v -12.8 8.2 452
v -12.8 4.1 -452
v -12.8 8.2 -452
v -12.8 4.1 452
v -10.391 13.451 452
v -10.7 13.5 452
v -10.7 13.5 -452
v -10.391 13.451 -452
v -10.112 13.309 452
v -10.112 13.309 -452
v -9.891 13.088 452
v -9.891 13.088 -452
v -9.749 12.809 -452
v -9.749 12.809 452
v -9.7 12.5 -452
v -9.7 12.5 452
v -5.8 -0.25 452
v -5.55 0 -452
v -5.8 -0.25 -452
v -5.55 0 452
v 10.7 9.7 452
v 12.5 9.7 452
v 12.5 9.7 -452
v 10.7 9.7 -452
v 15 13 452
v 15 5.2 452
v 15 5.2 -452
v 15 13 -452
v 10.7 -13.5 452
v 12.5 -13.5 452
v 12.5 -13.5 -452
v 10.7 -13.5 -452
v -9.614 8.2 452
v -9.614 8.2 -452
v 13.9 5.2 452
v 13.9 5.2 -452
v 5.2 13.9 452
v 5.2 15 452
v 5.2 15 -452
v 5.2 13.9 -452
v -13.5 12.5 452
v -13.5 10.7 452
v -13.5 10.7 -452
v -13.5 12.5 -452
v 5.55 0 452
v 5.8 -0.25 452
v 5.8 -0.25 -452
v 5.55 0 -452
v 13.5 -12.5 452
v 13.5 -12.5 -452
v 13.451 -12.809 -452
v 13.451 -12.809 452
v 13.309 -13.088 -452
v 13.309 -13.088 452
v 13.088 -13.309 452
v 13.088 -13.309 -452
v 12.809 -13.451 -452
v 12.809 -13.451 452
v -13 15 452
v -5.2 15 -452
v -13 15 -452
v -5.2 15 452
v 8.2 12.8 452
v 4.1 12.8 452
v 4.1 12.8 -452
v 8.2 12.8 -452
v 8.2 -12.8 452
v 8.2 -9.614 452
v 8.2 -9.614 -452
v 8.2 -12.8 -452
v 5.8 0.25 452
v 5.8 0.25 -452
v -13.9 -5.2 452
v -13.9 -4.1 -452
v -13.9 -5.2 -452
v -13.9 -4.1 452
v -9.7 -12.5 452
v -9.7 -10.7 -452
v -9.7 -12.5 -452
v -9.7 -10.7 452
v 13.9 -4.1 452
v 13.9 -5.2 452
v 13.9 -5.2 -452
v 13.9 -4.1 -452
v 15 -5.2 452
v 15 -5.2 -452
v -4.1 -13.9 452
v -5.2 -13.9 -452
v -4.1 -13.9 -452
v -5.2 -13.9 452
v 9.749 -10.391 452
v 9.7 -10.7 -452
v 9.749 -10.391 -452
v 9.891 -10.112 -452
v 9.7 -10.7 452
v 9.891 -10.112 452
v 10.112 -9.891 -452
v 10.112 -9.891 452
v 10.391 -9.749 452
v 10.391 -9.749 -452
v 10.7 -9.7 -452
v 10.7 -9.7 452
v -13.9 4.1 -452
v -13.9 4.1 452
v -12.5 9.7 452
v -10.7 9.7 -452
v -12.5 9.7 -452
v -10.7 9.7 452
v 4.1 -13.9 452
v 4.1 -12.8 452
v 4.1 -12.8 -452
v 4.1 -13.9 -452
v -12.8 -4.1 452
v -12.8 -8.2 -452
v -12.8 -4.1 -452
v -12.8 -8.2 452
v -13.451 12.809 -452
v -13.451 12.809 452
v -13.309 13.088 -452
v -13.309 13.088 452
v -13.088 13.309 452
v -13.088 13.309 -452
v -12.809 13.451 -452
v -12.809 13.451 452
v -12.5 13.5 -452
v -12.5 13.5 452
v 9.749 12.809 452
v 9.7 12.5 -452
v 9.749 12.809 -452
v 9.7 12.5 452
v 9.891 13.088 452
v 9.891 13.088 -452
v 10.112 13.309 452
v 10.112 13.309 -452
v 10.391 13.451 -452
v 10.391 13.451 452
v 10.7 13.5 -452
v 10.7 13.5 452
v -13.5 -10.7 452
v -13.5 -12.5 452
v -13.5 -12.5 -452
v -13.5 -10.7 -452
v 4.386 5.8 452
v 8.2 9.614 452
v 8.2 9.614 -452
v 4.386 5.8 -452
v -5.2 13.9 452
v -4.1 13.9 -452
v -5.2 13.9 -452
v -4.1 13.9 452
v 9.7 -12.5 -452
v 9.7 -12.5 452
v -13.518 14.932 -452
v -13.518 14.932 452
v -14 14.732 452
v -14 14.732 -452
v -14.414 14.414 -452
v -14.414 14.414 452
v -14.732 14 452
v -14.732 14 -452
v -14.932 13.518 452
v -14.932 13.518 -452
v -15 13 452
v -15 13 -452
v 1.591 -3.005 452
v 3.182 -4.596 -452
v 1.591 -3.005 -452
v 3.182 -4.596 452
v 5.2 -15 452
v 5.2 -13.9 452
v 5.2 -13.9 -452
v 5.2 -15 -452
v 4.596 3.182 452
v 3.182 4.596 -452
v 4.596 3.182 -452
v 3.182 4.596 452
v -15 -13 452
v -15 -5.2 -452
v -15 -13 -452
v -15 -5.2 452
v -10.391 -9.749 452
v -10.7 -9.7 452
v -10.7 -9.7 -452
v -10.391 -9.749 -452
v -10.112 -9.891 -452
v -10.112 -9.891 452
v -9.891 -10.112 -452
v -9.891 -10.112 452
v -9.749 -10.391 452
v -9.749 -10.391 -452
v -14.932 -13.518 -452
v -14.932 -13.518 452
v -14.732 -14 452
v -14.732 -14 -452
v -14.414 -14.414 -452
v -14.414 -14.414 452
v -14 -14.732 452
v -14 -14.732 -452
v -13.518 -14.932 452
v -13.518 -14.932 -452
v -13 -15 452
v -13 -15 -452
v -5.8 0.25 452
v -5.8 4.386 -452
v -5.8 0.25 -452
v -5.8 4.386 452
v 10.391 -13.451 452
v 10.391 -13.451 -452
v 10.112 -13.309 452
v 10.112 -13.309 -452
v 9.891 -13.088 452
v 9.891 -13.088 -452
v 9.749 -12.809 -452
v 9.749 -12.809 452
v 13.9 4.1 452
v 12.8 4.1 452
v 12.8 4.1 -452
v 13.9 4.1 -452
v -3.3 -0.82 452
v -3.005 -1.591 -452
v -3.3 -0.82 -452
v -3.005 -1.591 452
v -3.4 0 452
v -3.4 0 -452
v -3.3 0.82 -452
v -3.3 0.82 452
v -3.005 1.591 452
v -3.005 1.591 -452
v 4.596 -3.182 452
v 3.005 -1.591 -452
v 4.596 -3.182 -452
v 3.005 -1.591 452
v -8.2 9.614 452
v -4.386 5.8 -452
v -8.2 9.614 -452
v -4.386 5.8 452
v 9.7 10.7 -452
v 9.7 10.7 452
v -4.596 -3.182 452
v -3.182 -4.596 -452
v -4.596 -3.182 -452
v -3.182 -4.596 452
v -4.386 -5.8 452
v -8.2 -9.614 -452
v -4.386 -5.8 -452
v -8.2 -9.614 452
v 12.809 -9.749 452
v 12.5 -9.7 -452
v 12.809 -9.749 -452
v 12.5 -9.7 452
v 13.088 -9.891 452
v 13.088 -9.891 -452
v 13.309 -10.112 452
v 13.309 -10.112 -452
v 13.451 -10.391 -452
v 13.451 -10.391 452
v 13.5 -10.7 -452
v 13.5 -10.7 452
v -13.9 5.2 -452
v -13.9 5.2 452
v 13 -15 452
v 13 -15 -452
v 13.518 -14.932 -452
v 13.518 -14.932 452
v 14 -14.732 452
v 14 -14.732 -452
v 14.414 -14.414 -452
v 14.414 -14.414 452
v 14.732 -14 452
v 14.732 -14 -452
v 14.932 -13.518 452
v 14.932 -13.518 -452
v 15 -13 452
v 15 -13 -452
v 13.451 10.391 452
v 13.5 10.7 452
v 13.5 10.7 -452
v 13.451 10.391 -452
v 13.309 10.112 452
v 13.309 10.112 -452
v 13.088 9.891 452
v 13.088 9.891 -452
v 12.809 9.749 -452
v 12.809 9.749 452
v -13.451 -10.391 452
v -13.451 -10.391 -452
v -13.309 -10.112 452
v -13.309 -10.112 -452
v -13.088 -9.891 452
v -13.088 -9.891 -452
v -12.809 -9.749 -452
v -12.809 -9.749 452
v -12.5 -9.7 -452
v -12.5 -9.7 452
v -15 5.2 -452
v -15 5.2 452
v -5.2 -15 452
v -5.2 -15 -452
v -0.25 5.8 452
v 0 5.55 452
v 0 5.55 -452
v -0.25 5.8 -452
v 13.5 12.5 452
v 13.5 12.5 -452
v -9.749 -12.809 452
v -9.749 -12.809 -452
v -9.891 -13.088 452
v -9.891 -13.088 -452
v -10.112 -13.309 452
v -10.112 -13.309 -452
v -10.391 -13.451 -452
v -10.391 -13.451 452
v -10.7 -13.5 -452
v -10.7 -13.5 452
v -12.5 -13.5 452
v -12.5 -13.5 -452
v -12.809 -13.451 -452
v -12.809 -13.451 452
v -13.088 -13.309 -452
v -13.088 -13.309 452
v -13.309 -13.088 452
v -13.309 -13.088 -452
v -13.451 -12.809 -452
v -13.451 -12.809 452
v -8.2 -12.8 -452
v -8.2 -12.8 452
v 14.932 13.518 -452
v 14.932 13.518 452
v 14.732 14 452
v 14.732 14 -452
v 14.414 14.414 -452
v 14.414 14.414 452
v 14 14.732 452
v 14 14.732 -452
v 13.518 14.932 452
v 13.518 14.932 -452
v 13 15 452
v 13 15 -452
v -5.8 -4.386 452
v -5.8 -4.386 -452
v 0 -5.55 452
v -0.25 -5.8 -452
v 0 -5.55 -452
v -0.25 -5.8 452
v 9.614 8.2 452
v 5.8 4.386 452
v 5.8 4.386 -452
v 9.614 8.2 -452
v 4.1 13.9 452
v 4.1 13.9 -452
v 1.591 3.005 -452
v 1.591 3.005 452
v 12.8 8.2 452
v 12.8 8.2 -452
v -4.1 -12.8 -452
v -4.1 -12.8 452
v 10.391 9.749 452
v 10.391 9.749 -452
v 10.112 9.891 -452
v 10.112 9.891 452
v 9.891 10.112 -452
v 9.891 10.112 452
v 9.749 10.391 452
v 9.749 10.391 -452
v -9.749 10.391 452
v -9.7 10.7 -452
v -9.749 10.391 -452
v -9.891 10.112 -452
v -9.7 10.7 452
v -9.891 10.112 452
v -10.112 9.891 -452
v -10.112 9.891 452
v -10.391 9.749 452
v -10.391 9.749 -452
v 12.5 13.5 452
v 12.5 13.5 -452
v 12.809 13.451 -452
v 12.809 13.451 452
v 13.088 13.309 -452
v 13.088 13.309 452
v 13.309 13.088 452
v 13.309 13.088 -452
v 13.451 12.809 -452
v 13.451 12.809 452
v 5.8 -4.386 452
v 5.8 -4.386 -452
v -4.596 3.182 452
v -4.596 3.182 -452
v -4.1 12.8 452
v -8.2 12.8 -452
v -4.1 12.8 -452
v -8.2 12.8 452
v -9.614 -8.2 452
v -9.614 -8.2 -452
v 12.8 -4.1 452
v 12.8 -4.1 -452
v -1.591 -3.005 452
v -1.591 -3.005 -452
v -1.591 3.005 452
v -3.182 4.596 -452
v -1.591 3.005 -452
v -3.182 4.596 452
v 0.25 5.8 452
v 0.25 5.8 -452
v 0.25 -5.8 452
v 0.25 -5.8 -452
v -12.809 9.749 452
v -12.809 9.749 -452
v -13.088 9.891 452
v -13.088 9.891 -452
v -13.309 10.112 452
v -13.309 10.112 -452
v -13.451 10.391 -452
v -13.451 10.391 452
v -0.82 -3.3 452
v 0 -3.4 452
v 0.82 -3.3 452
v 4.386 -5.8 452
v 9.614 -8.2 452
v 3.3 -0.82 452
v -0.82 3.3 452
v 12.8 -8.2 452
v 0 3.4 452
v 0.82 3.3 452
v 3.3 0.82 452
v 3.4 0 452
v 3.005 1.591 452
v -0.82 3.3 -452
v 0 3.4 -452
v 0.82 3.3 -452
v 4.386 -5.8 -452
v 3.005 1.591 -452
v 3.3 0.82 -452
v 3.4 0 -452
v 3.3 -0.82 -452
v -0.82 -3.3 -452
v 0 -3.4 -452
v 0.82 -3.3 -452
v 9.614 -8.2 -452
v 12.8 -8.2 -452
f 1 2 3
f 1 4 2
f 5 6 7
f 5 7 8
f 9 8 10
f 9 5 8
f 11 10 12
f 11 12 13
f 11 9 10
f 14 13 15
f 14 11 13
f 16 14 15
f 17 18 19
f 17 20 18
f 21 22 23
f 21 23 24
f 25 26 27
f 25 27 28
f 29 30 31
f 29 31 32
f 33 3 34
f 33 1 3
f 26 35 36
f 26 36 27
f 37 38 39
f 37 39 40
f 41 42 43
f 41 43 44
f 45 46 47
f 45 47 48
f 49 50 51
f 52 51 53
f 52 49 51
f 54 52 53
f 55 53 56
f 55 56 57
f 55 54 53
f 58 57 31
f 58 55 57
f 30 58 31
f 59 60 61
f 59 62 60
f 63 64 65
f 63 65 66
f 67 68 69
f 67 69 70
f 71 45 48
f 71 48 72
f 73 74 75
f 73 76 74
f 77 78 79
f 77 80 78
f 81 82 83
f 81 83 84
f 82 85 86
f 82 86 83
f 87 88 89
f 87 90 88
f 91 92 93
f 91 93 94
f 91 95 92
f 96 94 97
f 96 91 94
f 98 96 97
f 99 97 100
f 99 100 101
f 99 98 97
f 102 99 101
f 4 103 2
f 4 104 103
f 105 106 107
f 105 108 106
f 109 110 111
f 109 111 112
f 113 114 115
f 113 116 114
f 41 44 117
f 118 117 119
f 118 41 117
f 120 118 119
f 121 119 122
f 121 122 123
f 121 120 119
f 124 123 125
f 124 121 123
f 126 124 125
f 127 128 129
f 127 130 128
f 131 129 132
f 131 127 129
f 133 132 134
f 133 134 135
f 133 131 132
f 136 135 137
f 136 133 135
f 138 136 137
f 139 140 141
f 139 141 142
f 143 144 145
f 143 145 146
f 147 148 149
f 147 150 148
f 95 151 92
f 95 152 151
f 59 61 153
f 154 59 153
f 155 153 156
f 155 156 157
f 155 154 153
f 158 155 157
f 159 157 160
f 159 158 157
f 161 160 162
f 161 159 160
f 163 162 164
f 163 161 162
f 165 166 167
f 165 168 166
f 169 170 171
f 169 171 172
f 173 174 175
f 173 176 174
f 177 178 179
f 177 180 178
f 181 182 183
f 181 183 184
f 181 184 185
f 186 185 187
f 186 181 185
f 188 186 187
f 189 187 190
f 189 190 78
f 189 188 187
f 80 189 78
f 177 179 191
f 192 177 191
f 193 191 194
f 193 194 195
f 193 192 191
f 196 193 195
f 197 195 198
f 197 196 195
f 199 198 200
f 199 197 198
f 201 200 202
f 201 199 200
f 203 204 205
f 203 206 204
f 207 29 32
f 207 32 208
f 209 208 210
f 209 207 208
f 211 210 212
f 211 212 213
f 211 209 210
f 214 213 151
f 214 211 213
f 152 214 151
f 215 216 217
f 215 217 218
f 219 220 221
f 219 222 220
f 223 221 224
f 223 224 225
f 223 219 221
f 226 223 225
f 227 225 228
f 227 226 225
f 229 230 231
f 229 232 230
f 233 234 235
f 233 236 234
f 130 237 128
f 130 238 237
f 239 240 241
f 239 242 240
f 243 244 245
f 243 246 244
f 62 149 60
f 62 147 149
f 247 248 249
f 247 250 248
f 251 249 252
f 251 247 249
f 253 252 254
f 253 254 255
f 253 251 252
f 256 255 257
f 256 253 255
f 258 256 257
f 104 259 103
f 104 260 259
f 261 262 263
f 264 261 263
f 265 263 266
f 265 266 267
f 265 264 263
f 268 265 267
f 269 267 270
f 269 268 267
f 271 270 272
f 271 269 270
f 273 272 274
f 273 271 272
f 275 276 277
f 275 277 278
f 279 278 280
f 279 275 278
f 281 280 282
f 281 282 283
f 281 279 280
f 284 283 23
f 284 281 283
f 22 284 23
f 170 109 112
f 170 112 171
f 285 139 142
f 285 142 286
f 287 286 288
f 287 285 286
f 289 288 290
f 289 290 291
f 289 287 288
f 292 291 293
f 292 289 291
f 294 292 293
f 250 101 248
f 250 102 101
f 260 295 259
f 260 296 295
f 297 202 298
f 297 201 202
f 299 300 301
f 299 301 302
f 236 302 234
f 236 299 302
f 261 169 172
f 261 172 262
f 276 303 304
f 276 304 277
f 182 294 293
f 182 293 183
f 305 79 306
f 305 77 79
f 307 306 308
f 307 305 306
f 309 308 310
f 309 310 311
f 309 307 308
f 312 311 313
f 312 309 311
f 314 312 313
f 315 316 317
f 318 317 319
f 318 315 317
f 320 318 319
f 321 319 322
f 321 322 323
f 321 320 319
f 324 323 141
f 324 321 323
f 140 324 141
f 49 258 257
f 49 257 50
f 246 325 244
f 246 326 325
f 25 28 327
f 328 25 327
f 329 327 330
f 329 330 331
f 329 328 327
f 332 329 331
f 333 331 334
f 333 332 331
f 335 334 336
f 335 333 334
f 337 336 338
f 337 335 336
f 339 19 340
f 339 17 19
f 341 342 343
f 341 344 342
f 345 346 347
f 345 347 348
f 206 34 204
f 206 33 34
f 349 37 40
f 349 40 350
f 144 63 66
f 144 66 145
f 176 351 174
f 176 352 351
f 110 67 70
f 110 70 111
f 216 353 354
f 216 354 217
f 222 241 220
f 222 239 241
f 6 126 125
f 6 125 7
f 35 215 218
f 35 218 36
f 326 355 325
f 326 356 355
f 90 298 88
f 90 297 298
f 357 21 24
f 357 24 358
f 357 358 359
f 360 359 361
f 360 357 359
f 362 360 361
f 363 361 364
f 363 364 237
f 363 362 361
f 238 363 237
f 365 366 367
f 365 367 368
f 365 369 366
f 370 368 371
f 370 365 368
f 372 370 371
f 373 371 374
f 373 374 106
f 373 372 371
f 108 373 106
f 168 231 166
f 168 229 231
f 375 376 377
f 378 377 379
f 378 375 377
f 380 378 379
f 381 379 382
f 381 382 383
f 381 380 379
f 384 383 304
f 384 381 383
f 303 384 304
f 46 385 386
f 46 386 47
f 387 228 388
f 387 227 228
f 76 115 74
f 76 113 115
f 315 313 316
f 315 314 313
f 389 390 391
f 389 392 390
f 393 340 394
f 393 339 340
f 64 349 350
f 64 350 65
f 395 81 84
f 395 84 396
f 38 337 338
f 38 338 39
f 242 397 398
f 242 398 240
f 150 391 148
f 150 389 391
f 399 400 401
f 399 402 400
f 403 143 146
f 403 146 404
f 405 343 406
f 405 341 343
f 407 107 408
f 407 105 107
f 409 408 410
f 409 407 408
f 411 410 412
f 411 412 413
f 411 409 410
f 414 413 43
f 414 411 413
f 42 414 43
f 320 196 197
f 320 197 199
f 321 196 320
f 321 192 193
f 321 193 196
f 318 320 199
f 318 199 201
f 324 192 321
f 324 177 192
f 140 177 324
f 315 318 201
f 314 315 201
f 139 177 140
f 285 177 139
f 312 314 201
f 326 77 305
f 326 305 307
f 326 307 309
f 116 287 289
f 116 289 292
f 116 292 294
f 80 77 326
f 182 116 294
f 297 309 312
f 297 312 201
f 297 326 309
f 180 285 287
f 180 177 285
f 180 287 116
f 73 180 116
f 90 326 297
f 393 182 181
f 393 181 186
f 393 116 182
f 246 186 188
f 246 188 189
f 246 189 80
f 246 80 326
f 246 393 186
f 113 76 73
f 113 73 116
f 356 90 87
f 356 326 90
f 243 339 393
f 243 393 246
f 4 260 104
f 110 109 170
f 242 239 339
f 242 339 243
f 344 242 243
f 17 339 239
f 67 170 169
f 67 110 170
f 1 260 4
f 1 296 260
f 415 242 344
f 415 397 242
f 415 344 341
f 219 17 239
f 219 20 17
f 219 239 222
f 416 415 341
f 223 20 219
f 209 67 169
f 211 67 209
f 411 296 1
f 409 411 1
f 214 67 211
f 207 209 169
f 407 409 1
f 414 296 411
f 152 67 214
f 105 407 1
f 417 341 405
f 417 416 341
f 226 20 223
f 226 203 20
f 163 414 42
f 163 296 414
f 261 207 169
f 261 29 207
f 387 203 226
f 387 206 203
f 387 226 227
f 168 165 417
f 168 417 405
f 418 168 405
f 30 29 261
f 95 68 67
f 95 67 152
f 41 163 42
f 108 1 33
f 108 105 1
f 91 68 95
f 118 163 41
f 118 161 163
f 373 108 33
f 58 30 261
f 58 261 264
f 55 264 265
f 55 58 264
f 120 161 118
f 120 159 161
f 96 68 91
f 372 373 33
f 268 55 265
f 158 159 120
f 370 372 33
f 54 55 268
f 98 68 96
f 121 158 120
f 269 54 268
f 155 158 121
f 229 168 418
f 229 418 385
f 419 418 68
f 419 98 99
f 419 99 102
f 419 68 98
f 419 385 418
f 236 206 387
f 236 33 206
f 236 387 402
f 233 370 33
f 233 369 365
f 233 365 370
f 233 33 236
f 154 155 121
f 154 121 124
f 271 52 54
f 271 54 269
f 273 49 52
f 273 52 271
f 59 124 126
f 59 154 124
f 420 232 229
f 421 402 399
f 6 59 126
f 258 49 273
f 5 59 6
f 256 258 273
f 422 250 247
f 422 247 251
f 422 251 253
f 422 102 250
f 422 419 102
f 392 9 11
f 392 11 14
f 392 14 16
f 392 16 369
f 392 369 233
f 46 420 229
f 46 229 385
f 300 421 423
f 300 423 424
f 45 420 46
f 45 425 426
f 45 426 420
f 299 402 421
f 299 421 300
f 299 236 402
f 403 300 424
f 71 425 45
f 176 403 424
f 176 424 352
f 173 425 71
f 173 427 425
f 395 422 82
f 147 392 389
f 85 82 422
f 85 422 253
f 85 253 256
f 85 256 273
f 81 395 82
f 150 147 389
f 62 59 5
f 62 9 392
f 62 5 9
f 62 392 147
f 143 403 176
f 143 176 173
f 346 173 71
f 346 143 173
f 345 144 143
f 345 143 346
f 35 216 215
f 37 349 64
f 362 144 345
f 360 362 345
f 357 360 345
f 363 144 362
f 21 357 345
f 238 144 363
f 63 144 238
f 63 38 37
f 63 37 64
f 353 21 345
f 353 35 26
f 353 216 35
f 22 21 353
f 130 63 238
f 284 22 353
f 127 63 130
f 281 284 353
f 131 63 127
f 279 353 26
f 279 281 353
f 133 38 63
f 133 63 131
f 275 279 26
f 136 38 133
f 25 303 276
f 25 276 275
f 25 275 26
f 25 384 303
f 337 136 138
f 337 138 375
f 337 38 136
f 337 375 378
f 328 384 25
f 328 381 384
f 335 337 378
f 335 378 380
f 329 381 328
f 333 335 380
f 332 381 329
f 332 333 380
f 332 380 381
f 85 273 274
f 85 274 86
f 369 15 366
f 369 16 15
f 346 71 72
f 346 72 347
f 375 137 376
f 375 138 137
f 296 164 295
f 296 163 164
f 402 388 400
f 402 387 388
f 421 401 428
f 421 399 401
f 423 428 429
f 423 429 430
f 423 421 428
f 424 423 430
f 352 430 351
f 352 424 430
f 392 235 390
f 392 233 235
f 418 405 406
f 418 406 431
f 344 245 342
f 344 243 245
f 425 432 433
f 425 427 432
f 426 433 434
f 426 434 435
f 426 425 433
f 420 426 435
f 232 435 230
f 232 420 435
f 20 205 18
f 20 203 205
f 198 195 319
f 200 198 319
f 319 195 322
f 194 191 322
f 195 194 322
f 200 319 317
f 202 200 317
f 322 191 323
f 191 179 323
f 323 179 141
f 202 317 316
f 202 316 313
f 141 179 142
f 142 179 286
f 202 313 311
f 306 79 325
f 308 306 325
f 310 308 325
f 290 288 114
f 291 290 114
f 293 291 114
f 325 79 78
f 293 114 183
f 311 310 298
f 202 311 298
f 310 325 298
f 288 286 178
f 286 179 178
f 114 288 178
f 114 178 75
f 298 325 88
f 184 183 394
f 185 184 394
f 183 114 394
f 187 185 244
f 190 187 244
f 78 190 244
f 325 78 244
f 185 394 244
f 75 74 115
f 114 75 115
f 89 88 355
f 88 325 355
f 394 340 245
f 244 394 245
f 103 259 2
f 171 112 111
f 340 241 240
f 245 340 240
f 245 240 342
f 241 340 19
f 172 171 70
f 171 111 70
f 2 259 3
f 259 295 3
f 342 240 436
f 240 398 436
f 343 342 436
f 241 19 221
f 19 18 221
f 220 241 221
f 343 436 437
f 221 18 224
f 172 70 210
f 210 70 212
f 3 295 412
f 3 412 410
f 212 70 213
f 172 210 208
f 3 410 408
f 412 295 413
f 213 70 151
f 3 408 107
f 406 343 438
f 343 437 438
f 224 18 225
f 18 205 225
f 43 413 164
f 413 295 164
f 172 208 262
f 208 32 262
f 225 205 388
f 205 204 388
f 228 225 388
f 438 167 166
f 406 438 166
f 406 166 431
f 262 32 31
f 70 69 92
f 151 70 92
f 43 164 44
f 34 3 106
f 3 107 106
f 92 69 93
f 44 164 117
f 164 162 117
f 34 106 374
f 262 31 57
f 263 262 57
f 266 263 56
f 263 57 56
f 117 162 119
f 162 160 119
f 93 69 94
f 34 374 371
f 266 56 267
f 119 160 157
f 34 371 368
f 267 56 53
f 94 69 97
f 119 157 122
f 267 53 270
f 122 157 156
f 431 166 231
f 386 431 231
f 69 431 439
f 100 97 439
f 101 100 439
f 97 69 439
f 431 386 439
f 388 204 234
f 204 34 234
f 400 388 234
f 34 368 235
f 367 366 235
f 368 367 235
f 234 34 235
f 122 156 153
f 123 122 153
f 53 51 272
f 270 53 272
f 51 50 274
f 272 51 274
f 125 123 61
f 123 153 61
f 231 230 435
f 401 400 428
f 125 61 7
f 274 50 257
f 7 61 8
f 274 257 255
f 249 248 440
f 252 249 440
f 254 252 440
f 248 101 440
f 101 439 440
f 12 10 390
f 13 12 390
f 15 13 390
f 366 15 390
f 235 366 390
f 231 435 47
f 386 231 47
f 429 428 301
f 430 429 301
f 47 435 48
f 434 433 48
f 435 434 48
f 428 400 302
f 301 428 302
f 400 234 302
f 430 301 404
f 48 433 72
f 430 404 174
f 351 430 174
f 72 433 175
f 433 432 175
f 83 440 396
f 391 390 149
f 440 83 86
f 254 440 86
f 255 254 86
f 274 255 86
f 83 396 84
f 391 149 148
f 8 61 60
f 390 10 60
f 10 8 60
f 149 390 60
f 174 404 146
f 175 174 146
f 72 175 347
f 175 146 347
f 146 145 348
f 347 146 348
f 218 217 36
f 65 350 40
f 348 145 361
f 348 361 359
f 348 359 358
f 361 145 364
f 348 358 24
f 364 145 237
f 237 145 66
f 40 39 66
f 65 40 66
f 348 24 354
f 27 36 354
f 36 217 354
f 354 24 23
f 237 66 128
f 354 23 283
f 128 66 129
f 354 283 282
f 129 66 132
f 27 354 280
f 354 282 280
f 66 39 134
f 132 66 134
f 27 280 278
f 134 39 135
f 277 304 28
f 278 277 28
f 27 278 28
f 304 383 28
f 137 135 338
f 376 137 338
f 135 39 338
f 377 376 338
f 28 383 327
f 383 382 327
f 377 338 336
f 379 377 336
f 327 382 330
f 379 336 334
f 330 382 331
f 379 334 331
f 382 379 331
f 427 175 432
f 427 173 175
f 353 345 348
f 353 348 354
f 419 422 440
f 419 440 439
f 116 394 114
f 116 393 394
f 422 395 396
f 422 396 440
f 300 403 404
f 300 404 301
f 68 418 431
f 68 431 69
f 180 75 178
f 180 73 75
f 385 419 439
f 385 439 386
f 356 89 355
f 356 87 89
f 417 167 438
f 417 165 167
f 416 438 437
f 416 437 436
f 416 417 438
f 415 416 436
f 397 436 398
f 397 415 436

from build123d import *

# Parameters (mm, degrees)
BOSS_EXTRUDE1_DEPTH = 452


with BuildPart() as part:
    # Sketch1 → Boss-Extrude1 (new, symmetric)
    with BuildSketch(Plane.XY):
        with BuildLine():
            Line((0, -5.55), (0.25, -5.8))
            Line((0.25, -5.8), (4.385786438, -5.8))
            Line((4.385786438, -5.8), (8.2, -9.614213562))
            Line((8.2, -9.614213562), (8.2, -12.8))
            Line((8.2, -12.8), (4.1, -12.8))
            Line((4.1, -12.8), (4.1, -13.9))
            Line((4.1, -13.9), (5.2, -13.9))
            Line((5.2, -13.9), (5.2, -15))
            Line((5.2, -15), (13, -15))
            ThreePointArc((13, -15), (14.414213562, -14.414213562), (15, -13))
            Line((15, -13), (15, -5.2))
            Line((15, -5.2), (13.9, -5.2))
            Line((13.9, -5.2), (13.9, -4.1))
            Line((13.9, -4.1), (12.8, -4.1))
            Line((12.8, -4.1), (12.8, -8.2))
            Line((12.8, -8.2), (9.614213562, -8.2))
            Line((9.614213562, -8.2), (5.8, -4.385786438))
            Line((5.8, -4.385786438), (5.8, -0.25))
            Line((5.8, -0.25), (5.55, 0))
            Line((5.55, 0), (5.8, 0.25))
            Line((5.8, 0.25), (5.8, 4.385786438))
            Line((5.8, 4.385786438), (9.614213562, 8.2))
            Line((9.614213562, 8.2), (12.8, 8.2))
            Line((12.8, 8.2), (12.8, 4.1))
            Line((12.8, 4.1), (13.9, 4.1))
            Line((13.9, 4.1), (13.9, 5.2))
            Line((13.9, 5.2), (15, 5.2))
            Line((15, 5.2), (15, 13))
            ThreePointArc((15, 13), (14.414213562, 14.414213562), (13, 15))
            Line((13, 15), (5.2, 15))
            Line((5.2, 15), (5.2, 13.9))
            Line((5.2, 13.9), (4.1, 13.9))
            Line((4.1, 13.9), (4.1, 12.8))
            Line((4.1, 12.8), (8.2, 12.8))
            Line((8.2, 12.8), (8.2, 9.614213562))
            Line((8.2, 9.614213562), (4.385786438, 5.8))
            Line((4.385786438, 5.8), (0.25, 5.8))
            Line((0.25, 5.8), (0, 5.55))
            Line((0, 5.55), (-0.25, 5.8))
            Line((-0.25, 5.8), (-4.385786438, 5.8))
            Line((-4.385786438, 5.8), (-8.2, 9.614213562))
            Line((-8.2, 9.614213562), (-8.2, 12.8))
            Line((-8.2, 12.8), (-4.1, 12.8))
            Line((-4.1, 12.8), (-4.1, 13.9))
            Line((-4.1, 13.9), (-5.2, 13.9))
            Line((-5.2, 13.9), (-5.2, 15))
            Line((-5.2, 15), (-13, 15))
            ThreePointArc((-13, 15), (-14.414213562, 14.414213562), (-15, 13))
            Line((-15, 13), (-15, 5.2))
            Line((-15, 5.2), (-13.9, 5.2))
            Line((-13.9, 5.2), (-13.9, 4.1))
            Line((-13.9, 4.1), (-12.8, 4.1))
            Line((-12.8, 4.1), (-12.8, 8.2))
            Line((-12.8, 8.2), (-9.614213562, 8.2))
            Line((-9.614213562, 8.2), (-5.8, 4.385786438))
            Line((-5.8, 4.385786438), (-5.8, 0.25))
            Line((-5.8, 0.25), (-5.55, 0))
            Line((-5.55, 0), (-5.8, -0.25))
            Line((-5.8, -0.25), (-5.8, -4.385786438))
            Line((-5.8, -4.385786438), (-9.614213562, -8.2))
            Line((-9.614213562, -8.2), (-12.8, -8.2))
            Line((-12.8, -8.2), (-12.8, -4.1))
            Line((-12.8, -4.1), (-13.9, -4.1))
            Line((-13.9, -4.1), (-13.9, -5.2))
            Line((-13.9, -5.2), (-15, -5.2))
            Line((-15, -5.2), (-15, -13))
            ThreePointArc((-15, -13), (-14.414213562, -14.414213562), (-13, -15))
            Line((-13, -15), (-5.2, -15))
            Line((-5.2, -15), (-5.2, -13.9))
            Line((-5.2, -13.9), (-4.1, -13.9))
            Line((-4.1, -13.9), (-4.1, -12.8))
            Line((-4.1, -12.8), (-8.2, -12.8))
            Line((-8.2, -12.8), (-8.2, -9.614213562))
            Line((-8.2, -9.614213562), (-4.385786438, -5.8))
            Line((-4.385786438, -5.8), (-0.25, -5.8))
            Line((-0.25, -5.8), (0, -5.55))
        make_face()
        with BuildLine():
            Line((-13.5, 10.7), (-13.5, 12.5))
            ThreePointArc((-13.5, 12.5), (-13.207106781, 13.207106781), (-12.5, 13.5))
            Line((-12.5, 13.5), (-10.7, 13.5))
            ThreePointArc((-10.7, 13.5), (-9.992893219, 13.207106781), (-9.7, 12.5))
            Line((-9.7, 12.5), (-9.7, 10.7))
            ThreePointArc((-9.7, 10.7), (-9.992893219, 9.992893219), (-10.7, 9.7))
            Line((-10.7, 9.7), (-12.5, 9.7))
            ThreePointArc((-12.5, 9.7), (-13.207106781, 9.992893219), (-13.5, 10.7))
        make_face(mode=Mode.SUBTRACT)
        with BuildLine():
            Line((-13.5, -12.5), (-13.5, -10.7))
            ThreePointArc((-13.5, -10.7), (-13.207106781, -9.992893219), (-12.5, -9.7))
            Line((-12.5, -9.7), (-10.7, -9.7))
            ThreePointArc((-10.7, -9.7), (-9.992893219, -9.992893219), (-9.7, -10.7))
            Line((-9.7, -10.7), (-9.7, -12.5))
            ThreePointArc((-9.7, -12.5), (-9.992893219, -13.207106781), (-10.7, -13.5))
            Line((-10.7, -13.5), (-12.5, -13.5))
            ThreePointArc((-12.5, -13.5), (-13.207106781, -13.207106781), (-13.5, -12.5))
        make_face(mode=Mode.SUBTRACT)
        with BuildLine():
            Line((13.5, -10.7), (13.5, -12.5))
            ThreePointArc((13.5, -12.5), (13.207106781, -13.207106781), (12.5, -13.5))
            Line((12.5, -13.5), (10.7, -13.5))
            ThreePointArc((10.7, -13.5), (9.992893219, -13.207106781), (9.7, -12.5))
            Line((9.7, -12.5), (9.7, -10.7))
            ThreePointArc((9.7, -10.7), (9.992893219, -9.992893219), (10.7, -9.7))
            Line((10.7, -9.7), (12.5, -9.7))
            ThreePointArc((12.5, -9.7), (13.207106781, -9.992893219), (13.5, -10.7))
        make_face(mode=Mode.SUBTRACT)
        with BuildLine():
            Line((13.5, 12.5), (13.5, 10.7))
            ThreePointArc((13.5, 10.7), (13.207106781, 9.992893219), (12.5, 9.7))
            Line((12.5, 9.7), (10.7, 9.7))
            ThreePointArc((10.7, 9.7), (9.992893219, 9.992893219), (9.7, 10.7))
            Line((9.7, 10.7), (9.7, 12.5))
            ThreePointArc((9.7, 12.5), (9.992893219, 13.207106781), (10.7, 13.5))
            Line((10.7, 13.5), (12.5, 13.5))
            ThreePointArc((12.5, 13.5), (13.207106781, 13.207106781), (13.5, 12.5))
        make_face(mode=Mode.SUBTRACT)
        with BuildLine():
            Line((-1.590718277, -3.00493184), (-3.181708535, -4.595922097))
            Line((-3.181708535, -4.595922097), (-4.595922097, -3.181708535))
            Line((-4.595922097, -3.181708535), (-3.00493184, -1.590718277))
            ThreePointArc((-3.00493184, -1.590718277), (-3.4, 0), (-3.00493184, 1.590718277))
            Line((-3.00493184, 1.590718277), (-4.595922097, 3.181708535))
            Line((-4.595922097, 3.181708535), (-3.181708535, 4.595922097))
            Line((-3.181708535, 4.595922097), (-1.590718277, 3.00493184))
            ThreePointArc((-1.590718277, 3.00493184), (0, 3.4), (1.590718277, 3.00493184))
            Line((1.590718277, 3.00493184), (3.181708535, 4.595922097))
            Line((3.181708535, 4.595922097), (4.595922097, 3.181708535))
            Line((4.595922097, 3.181708535), (3.00493184, 1.590718277))
            ThreePointArc((3.00493184, 1.590718277), (3.4, 0), (3.00493184, -1.590718277))
            Line((3.00493184, -1.590718277), (4.595922097, -3.181708535))
            Line((4.595922097, -3.181708535), (3.181708535, -4.595922097))
            Line((3.181708535, -4.595922097), (1.590718277, -3.00493184))
            ThreePointArc((1.590718277, -3.00493184), (0, -3.4), (-1.590718277, -3.00493184))
        make_face(mode=Mode.SUBTRACT)
    extrude(amount=BOSS_EXTRUDE1_DEPTH, both=True)


solid = part.part
